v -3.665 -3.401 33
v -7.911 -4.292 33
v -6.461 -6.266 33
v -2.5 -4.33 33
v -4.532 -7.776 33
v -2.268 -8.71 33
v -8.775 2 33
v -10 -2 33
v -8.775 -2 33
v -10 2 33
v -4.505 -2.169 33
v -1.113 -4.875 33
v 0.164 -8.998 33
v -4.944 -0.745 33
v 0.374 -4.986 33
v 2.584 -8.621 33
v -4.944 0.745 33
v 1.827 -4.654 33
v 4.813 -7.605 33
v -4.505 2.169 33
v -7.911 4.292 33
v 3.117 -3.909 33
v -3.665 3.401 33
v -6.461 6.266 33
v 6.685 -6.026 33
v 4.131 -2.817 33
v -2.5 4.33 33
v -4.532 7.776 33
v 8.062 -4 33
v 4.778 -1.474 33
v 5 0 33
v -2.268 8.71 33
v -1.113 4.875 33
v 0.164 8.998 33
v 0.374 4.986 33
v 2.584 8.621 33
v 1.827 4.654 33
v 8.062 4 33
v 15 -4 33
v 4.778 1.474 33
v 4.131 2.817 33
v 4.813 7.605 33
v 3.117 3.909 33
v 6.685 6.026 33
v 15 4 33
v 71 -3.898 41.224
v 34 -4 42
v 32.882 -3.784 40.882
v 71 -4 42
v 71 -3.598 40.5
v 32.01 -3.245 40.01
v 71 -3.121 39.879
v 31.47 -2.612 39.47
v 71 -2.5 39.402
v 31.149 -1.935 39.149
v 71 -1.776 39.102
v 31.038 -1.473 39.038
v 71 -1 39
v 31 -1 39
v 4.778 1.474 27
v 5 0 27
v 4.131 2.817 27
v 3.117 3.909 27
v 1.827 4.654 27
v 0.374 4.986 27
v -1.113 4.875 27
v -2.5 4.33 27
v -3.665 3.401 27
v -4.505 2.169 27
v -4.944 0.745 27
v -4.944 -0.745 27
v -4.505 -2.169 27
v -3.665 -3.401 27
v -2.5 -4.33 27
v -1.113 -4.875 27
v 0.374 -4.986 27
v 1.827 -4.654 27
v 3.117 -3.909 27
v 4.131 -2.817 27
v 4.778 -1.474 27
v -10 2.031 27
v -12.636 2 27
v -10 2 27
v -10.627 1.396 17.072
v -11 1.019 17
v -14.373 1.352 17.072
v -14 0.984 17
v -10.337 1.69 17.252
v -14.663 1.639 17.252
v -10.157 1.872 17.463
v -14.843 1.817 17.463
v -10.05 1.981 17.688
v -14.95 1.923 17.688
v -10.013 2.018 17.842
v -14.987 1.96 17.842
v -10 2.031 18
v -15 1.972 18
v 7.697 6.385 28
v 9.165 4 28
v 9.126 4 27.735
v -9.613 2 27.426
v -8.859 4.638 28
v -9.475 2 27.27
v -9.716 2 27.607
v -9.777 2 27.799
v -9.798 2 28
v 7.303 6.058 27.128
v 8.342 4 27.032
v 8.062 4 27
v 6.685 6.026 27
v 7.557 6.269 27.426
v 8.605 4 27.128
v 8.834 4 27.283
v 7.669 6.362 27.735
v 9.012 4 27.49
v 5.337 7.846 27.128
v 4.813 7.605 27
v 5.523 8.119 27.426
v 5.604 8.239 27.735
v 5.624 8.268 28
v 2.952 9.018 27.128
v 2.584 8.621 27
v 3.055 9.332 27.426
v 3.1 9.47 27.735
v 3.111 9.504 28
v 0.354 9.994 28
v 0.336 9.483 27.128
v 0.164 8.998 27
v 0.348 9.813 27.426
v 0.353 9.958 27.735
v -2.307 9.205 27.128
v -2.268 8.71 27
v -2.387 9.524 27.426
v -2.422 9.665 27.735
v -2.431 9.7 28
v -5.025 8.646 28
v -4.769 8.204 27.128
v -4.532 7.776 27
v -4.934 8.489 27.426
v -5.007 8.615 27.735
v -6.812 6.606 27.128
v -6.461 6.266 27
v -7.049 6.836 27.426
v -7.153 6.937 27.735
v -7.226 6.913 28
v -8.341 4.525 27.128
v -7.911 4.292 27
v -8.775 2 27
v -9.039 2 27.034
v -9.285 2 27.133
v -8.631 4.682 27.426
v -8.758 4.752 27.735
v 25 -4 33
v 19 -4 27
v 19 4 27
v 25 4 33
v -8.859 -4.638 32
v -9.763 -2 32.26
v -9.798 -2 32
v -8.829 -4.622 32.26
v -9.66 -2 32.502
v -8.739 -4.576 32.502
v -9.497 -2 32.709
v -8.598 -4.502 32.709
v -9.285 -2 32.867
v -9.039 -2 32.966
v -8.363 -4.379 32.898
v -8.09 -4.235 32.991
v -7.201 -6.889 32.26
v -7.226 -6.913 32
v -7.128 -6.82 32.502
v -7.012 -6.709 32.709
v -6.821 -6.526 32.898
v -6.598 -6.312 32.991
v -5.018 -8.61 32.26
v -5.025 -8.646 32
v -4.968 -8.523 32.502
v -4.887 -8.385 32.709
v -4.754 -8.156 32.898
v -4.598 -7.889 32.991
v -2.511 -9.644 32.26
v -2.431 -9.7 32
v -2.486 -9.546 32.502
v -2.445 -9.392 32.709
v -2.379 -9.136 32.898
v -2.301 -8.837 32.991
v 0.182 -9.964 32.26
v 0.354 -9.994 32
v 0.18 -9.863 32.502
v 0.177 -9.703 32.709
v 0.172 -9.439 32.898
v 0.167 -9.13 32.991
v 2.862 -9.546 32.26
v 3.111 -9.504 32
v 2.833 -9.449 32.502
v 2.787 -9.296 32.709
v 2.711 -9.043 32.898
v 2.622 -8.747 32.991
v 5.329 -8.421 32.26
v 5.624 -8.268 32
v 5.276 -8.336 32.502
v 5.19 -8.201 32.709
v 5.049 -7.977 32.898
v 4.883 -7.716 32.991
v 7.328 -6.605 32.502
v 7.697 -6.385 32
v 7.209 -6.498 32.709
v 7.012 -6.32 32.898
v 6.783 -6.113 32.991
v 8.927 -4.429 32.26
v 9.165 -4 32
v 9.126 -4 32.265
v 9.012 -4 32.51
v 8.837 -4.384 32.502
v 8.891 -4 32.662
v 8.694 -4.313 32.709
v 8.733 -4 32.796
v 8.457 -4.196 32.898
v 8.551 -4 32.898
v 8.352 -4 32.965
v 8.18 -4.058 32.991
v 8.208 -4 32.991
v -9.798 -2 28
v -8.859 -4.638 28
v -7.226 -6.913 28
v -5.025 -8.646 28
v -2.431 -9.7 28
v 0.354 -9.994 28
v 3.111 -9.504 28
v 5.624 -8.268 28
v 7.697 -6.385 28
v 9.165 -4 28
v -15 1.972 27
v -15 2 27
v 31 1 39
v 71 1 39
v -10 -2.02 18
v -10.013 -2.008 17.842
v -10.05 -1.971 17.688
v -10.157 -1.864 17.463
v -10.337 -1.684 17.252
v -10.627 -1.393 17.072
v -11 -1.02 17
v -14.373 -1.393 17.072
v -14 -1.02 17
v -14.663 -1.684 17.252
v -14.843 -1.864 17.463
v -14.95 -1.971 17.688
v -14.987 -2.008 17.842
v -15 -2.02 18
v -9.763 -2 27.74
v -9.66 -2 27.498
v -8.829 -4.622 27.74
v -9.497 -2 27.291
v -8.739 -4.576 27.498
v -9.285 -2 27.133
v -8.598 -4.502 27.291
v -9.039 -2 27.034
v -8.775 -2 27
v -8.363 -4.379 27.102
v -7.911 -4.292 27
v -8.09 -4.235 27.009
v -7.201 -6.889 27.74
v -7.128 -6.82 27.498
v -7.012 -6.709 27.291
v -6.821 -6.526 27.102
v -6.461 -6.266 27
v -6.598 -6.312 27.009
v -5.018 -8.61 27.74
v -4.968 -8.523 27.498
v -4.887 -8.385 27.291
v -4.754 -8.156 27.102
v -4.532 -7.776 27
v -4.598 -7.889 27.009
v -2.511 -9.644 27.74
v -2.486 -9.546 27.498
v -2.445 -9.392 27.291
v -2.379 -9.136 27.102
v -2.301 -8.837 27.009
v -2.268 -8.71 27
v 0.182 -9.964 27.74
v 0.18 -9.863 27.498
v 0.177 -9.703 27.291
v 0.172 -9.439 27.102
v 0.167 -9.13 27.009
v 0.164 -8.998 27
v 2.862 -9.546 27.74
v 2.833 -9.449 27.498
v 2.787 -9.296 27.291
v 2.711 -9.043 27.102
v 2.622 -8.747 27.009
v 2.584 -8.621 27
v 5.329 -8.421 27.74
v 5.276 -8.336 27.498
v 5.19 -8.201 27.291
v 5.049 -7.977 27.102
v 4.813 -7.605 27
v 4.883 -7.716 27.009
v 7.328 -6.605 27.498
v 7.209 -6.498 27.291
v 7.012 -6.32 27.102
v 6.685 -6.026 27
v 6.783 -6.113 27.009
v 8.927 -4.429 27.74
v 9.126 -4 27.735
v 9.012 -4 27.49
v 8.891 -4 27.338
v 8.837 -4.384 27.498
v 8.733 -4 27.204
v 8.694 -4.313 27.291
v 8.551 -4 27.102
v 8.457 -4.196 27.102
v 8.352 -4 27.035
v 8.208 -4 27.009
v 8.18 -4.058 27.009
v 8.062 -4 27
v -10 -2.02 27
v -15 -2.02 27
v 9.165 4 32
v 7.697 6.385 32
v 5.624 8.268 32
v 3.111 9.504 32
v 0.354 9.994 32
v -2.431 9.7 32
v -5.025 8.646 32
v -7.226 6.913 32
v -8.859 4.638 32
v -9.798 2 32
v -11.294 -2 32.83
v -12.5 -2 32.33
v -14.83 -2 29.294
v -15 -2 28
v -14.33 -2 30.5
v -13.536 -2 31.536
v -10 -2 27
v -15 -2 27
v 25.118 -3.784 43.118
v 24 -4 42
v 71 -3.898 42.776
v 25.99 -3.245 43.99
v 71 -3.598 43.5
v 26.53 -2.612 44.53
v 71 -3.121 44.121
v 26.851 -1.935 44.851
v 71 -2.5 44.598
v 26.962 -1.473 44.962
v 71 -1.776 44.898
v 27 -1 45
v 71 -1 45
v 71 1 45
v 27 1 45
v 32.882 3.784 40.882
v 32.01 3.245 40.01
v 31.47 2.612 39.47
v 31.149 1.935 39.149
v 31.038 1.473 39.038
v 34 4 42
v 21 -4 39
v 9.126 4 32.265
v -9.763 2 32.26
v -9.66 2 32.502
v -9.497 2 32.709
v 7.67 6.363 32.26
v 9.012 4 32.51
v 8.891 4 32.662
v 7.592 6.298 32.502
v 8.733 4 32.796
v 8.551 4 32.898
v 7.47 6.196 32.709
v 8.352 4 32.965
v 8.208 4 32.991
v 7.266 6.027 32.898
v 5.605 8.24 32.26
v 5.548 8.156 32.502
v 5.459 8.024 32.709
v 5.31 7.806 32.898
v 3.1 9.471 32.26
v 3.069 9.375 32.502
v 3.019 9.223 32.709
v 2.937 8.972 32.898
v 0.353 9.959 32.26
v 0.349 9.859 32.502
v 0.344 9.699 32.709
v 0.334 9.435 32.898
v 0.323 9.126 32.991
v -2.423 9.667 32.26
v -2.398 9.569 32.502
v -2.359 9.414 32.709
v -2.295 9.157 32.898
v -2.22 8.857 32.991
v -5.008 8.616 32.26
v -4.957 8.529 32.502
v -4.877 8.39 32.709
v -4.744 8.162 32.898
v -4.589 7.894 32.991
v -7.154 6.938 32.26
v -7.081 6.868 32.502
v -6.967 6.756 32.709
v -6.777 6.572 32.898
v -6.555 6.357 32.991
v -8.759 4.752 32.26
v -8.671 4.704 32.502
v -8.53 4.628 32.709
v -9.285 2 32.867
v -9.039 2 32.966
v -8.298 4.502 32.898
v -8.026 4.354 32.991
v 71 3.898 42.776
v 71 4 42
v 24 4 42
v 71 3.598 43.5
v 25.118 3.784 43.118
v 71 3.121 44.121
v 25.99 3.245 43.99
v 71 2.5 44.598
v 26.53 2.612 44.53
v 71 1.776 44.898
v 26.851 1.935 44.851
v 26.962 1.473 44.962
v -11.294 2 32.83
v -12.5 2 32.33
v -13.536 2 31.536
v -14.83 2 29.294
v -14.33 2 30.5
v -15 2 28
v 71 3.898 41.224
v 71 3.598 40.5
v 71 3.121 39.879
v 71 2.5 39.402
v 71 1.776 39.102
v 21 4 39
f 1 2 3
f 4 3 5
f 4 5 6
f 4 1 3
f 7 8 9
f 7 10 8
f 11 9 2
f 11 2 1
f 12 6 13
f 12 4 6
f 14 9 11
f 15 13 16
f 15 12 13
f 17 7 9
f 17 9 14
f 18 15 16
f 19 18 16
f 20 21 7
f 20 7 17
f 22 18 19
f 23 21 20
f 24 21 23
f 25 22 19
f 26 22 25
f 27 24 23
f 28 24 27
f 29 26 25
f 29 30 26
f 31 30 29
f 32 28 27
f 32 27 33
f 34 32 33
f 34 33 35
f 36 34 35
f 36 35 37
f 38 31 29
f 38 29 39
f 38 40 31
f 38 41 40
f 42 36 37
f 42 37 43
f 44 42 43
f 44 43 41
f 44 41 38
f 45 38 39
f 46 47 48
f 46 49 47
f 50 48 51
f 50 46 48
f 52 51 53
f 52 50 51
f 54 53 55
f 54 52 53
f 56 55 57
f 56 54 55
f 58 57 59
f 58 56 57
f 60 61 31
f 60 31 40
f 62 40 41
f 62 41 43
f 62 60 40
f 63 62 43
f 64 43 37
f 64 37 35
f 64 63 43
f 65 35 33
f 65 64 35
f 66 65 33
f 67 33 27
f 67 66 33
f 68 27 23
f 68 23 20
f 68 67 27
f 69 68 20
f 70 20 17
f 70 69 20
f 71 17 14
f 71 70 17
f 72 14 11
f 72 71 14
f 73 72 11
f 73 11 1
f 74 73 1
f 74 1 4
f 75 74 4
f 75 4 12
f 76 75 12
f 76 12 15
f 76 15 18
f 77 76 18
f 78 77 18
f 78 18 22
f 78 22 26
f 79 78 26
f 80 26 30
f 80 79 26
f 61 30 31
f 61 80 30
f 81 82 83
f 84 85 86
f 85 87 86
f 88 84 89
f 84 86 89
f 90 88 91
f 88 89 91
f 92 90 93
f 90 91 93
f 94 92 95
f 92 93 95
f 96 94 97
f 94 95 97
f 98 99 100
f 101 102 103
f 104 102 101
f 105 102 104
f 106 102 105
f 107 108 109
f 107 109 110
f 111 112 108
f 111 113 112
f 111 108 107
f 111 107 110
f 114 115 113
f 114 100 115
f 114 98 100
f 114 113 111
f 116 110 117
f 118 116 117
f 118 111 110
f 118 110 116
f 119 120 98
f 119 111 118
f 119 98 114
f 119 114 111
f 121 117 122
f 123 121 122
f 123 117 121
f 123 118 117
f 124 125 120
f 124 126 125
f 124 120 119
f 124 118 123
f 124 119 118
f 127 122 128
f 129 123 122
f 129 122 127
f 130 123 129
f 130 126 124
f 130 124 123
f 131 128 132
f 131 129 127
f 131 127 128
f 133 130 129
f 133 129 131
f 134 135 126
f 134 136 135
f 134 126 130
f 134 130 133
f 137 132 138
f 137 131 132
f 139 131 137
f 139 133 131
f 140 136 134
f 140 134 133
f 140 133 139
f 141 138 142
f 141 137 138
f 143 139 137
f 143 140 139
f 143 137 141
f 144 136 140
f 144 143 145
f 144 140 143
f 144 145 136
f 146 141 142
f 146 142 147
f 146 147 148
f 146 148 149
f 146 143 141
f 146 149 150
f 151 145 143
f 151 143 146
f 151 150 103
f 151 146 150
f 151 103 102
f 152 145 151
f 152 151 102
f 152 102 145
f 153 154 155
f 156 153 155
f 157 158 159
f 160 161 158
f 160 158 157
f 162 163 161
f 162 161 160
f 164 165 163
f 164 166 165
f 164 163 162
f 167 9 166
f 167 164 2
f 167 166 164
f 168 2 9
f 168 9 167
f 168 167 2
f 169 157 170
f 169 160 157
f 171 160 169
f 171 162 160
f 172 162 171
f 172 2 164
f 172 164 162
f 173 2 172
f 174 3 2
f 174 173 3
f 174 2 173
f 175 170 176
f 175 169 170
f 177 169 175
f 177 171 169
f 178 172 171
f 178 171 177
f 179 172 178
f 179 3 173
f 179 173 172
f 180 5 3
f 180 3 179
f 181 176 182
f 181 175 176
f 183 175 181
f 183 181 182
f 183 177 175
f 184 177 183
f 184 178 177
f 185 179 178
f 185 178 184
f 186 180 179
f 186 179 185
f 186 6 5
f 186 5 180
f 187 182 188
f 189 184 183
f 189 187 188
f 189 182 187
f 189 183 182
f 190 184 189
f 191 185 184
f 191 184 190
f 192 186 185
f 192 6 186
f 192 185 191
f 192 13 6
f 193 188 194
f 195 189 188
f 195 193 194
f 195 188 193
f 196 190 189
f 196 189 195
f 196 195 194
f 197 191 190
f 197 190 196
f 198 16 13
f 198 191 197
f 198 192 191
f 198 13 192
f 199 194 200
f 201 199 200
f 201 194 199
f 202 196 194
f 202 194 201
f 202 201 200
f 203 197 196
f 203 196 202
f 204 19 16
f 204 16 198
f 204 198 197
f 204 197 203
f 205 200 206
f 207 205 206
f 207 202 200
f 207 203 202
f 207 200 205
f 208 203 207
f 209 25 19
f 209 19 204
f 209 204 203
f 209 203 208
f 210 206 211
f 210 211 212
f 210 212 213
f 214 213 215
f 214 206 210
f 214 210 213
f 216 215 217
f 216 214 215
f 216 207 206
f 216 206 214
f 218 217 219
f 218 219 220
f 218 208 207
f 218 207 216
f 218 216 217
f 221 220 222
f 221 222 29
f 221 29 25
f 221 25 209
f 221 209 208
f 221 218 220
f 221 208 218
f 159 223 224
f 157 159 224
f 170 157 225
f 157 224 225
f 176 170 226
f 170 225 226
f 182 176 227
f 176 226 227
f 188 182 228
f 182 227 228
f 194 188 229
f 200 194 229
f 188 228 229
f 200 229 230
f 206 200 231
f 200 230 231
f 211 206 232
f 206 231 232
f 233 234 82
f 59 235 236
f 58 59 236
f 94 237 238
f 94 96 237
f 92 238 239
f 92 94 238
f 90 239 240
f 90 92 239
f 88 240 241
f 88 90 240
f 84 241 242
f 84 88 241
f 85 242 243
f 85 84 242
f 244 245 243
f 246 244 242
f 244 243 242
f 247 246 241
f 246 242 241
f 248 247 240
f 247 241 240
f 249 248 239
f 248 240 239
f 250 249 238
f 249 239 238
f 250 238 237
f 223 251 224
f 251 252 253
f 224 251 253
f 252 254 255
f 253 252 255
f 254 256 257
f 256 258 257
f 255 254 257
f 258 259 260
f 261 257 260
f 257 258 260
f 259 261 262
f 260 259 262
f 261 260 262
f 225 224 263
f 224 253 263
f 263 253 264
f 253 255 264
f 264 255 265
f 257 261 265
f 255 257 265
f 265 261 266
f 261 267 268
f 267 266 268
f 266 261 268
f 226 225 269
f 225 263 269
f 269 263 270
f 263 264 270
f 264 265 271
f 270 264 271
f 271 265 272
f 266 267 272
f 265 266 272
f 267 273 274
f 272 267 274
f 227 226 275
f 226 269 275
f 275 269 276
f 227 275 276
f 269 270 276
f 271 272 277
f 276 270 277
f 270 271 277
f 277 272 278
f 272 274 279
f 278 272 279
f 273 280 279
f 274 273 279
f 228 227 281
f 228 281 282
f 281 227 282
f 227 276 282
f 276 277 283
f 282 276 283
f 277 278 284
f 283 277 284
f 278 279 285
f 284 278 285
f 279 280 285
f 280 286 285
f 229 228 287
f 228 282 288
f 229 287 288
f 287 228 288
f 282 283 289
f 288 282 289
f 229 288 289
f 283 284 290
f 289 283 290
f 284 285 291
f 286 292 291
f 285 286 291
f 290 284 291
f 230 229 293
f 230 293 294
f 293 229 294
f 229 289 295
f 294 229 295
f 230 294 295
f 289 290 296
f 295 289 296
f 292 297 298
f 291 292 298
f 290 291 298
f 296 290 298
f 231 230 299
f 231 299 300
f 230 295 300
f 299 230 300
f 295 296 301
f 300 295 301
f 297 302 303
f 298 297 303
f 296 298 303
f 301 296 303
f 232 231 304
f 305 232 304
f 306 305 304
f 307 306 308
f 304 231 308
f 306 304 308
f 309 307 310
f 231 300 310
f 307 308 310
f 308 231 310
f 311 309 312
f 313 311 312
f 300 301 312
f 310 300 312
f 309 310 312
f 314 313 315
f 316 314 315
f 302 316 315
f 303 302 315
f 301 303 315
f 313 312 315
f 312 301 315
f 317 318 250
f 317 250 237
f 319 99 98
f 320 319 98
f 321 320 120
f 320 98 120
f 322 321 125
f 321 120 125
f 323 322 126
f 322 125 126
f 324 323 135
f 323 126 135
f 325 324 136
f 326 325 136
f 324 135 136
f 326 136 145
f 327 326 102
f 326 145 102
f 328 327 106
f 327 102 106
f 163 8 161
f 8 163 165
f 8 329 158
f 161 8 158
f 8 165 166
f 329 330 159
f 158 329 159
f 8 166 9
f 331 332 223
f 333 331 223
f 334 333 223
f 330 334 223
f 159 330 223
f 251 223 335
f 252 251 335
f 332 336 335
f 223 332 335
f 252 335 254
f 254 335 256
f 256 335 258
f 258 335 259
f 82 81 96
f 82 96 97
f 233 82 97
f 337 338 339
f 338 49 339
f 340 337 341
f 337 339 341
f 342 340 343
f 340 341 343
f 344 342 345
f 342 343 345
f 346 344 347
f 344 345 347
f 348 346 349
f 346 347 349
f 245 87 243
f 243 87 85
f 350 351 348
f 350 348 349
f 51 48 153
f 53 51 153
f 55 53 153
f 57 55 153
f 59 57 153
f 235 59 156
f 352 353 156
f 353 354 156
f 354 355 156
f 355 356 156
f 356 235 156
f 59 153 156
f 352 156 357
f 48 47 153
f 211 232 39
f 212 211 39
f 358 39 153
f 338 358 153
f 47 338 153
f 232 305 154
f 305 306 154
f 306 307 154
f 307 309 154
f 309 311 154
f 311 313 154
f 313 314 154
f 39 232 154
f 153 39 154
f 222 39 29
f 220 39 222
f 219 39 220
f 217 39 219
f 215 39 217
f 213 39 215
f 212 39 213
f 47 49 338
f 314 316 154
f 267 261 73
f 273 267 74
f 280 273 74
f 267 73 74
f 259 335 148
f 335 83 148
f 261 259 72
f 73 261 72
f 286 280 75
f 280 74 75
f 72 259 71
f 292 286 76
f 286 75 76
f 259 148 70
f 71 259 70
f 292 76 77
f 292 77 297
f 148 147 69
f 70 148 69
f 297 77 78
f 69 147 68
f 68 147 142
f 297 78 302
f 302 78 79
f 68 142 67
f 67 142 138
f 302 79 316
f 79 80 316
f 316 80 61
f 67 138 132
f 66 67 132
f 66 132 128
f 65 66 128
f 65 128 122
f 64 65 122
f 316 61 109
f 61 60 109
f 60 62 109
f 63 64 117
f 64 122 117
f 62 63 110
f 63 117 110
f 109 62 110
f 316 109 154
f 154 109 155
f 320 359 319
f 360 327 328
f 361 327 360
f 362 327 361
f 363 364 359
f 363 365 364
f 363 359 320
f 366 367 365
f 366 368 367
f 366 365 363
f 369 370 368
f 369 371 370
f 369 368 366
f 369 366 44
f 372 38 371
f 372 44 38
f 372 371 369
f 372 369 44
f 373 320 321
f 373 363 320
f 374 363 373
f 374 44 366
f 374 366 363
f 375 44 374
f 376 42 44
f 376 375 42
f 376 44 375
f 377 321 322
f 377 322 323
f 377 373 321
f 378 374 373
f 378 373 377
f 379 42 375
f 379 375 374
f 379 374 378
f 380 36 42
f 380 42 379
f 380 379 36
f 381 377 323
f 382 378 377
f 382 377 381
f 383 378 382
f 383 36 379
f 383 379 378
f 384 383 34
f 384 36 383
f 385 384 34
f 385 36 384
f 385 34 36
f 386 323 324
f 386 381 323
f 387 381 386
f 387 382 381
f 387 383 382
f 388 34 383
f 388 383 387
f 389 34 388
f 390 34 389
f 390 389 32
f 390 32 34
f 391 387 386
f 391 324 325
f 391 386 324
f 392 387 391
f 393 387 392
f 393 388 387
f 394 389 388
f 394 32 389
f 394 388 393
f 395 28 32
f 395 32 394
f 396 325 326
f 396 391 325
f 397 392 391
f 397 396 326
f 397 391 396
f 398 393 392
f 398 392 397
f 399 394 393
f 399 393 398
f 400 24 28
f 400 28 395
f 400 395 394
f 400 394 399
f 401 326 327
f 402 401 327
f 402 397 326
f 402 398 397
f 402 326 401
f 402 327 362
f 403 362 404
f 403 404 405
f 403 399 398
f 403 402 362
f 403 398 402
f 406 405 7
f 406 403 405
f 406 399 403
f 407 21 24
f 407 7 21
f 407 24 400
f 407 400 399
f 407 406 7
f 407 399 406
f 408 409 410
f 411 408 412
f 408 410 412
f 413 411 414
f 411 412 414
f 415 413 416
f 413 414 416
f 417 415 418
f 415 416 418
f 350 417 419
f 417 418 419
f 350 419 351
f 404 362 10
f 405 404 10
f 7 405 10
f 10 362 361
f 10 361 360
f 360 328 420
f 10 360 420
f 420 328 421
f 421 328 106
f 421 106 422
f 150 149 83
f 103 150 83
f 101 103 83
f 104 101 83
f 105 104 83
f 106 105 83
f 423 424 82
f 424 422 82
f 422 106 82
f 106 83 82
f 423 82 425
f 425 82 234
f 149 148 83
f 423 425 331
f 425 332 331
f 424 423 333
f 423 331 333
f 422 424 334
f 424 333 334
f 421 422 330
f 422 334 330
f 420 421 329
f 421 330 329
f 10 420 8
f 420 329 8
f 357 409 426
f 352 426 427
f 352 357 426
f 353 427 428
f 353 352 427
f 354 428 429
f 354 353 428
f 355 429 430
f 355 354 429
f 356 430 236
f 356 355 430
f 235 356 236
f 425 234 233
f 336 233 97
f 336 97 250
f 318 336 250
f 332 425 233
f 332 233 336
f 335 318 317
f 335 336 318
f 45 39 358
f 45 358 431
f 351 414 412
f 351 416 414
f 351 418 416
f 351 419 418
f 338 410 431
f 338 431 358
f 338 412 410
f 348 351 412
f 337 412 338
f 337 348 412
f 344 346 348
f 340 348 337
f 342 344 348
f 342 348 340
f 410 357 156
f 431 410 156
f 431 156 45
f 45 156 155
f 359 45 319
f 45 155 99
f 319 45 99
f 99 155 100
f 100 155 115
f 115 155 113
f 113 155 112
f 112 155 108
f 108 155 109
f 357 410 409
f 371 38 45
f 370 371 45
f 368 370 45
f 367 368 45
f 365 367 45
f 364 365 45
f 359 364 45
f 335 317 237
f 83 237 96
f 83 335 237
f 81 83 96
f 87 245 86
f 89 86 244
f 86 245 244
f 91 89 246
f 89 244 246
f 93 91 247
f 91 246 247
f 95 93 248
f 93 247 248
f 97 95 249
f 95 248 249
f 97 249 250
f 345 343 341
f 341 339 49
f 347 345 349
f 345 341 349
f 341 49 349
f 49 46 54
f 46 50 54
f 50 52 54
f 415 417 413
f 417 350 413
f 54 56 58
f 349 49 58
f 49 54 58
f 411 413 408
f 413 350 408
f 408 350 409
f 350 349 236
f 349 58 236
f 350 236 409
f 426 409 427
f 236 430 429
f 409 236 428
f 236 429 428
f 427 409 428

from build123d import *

# Parameters (mm, degrees)
F1_R     = 5
F2_DEPTH = 6
F4_DEPTH = 10
F5_R     = 5
F6_W     = 10
F6_H     = 8
F7_DEPTH = 6
F9_DEPTH = 6
F10_SIZE = 5.99999
F11_R    = 2.99999
F12_R    = 1
F13_R    = 1


# Not quite as in the source:
# - a fillet or chamfer is up to 0.001 mm smaller than in the source, because OpenCascade refuses the exact size


with BuildPart() as f2:
    # F1 (on offset) → F2 (new body)
    with BuildSketch(Plane.XY.offset(27)):
        with BuildLine():
            ThreePointArc((9.1651513899, -4), (9.7890631293, -2.0430964369), (10, 0))
            ThreePointArc((10, 0), (9.7890631293, 2.0430964369), (9.1651513899, 4))
            ThreePointArc((9.1651513899, 4), (-1.048861935, 9.9448423135), (-9.7979589711, 2))
            ThreePointArc((-9.7979589711, 2), (-9.9493615301, 1.0050896201), (-10, 0))
            ThreePointArc((-10, 0), (-9.9493615301, -1.0050896201), (-9.7979589711, -2))
            ThreePointArc((-9.7979589711, -2), (-1.048861935, -9.9448423135), (9.1651513899, -4))
        make_face()
        Circle(F1_R, mode=Mode.SUBTRACT)
        with BuildLine():
            Line((25, 0), (10, 0))
            ThreePointArc((10, 0), (9.7890631293, -2.0430964369), (9.1651513899, -4))
            Line((9.1651513899, -4), (25, -4))
            Line((25, -4), (25, 0))
        make_face()
        with BuildLine():
            ThreePointArc((9.1651513899, 4), (9.7890631293, 2.0430964369), (10, 0))
            Line((10, 0), (25, 0))
            Line((25, 0), (25, 4))
            Line((25, 4), (9.1651513899, 4))
        make_face()
        with BuildLine():
            ThreePointArc((-10, 0), (-9.9493615301, 1.0050896201), (-9.7979589711, 2))
            Line((-9.7979589711, 2), (-15, 2))
            Line((-15, 2), (-15, 0))
            Line((-15, 0), (-10, 0))
        make_face()
        with BuildLine():
            Line((-15, -2), (-9.7979589711, -2))
            ThreePointArc((-9.7979589711, -2), (-9.9493615301, -1.0050896201), (-10, 0))
            Line((-10, 0), (-15, 0))
            Line((-15, 0), (-15, -2))
        make_face()
    extrude(amount=F2_DEPTH)

    # F3 (on offset) → F4 (join)
    with BuildSketch(Plane.XY.offset(27)):
        Polygon((-10, -2.0203573131), (-10, 2.0309494015), (-15, 1.9722348321), (-15, -2.0203573131), align=None)
    extrude(amount=-F4_DEPTH)

    # F5
    f5_edges = [f2.edges().sort_by_distance(p)[0] for p in [
        (-15, 0, 33),
    ]]
    fillet(f5_edges, radius=F5_R)

    # F6 (on face) → F7 (join)
    with BuildSketch(Plane.XY.offset(33)):
        with Locations((20, 0)):
            Rectangle(F6_W, F6_H)
    extrude(amount=F7_DEPTH)

    # F8 (on face) → F9 (join)
    with BuildSketch(Plane.XY.offset(39)):
        Polygon((21, 4), (21, 0), (21, -4), (71, -4), (71, 4), align=None)
    extrude(amount=F9_DEPTH)

    # F10 (size 6 in the source; OpenCascade refuses exactly that, so slightly less here)
    f10_edges = [f2.edges().sort_by_distance(p)[0] for p in [
        (25, 0, 27),
        (15, 0, 39),
        (21, 0, 45),
        (25, 0, 39),
    ]]
    chamfer(f10_edges, length=F10_SIZE)

    # F11 (radius 3 in the source; OpenCascade refuses exactly that, so slightly less here)
    f11_edges = [f2.edges().sort_by_distance(p)[0] for p in [
        (48.999995, -4, 45),
        (50.999995, -4, 39),
        (50.999995, 4, 39),
        (48.999995, 4, 45),
    ]]
    fillet(f11_edges, radius=F11_R)

    # F12
    f12_edges = [f2.edges().sort_by_distance(p)[0] for p in [
        (-1.048862, -9.944842, 33),
        (-1.048862, -9.944842, 27),
        (-1.048862, 9.944842, 33),
        (-1.048862, 9.944842, 27),
    ]]
    fillet(f12_edges, radius=F12_R)

    # F13
    f13_edges = [f2.edges().sort_by_distance(p)[0] for p in [
        (-12.5, -2.020357, 17),
        (-15, -0.024061, 17),
        (-12.5, 2.001592, 17),
        (-10, 0.005296, 17),
    ]]
    fillet(f13_edges, radius=F13_R)


solid = f2.part
